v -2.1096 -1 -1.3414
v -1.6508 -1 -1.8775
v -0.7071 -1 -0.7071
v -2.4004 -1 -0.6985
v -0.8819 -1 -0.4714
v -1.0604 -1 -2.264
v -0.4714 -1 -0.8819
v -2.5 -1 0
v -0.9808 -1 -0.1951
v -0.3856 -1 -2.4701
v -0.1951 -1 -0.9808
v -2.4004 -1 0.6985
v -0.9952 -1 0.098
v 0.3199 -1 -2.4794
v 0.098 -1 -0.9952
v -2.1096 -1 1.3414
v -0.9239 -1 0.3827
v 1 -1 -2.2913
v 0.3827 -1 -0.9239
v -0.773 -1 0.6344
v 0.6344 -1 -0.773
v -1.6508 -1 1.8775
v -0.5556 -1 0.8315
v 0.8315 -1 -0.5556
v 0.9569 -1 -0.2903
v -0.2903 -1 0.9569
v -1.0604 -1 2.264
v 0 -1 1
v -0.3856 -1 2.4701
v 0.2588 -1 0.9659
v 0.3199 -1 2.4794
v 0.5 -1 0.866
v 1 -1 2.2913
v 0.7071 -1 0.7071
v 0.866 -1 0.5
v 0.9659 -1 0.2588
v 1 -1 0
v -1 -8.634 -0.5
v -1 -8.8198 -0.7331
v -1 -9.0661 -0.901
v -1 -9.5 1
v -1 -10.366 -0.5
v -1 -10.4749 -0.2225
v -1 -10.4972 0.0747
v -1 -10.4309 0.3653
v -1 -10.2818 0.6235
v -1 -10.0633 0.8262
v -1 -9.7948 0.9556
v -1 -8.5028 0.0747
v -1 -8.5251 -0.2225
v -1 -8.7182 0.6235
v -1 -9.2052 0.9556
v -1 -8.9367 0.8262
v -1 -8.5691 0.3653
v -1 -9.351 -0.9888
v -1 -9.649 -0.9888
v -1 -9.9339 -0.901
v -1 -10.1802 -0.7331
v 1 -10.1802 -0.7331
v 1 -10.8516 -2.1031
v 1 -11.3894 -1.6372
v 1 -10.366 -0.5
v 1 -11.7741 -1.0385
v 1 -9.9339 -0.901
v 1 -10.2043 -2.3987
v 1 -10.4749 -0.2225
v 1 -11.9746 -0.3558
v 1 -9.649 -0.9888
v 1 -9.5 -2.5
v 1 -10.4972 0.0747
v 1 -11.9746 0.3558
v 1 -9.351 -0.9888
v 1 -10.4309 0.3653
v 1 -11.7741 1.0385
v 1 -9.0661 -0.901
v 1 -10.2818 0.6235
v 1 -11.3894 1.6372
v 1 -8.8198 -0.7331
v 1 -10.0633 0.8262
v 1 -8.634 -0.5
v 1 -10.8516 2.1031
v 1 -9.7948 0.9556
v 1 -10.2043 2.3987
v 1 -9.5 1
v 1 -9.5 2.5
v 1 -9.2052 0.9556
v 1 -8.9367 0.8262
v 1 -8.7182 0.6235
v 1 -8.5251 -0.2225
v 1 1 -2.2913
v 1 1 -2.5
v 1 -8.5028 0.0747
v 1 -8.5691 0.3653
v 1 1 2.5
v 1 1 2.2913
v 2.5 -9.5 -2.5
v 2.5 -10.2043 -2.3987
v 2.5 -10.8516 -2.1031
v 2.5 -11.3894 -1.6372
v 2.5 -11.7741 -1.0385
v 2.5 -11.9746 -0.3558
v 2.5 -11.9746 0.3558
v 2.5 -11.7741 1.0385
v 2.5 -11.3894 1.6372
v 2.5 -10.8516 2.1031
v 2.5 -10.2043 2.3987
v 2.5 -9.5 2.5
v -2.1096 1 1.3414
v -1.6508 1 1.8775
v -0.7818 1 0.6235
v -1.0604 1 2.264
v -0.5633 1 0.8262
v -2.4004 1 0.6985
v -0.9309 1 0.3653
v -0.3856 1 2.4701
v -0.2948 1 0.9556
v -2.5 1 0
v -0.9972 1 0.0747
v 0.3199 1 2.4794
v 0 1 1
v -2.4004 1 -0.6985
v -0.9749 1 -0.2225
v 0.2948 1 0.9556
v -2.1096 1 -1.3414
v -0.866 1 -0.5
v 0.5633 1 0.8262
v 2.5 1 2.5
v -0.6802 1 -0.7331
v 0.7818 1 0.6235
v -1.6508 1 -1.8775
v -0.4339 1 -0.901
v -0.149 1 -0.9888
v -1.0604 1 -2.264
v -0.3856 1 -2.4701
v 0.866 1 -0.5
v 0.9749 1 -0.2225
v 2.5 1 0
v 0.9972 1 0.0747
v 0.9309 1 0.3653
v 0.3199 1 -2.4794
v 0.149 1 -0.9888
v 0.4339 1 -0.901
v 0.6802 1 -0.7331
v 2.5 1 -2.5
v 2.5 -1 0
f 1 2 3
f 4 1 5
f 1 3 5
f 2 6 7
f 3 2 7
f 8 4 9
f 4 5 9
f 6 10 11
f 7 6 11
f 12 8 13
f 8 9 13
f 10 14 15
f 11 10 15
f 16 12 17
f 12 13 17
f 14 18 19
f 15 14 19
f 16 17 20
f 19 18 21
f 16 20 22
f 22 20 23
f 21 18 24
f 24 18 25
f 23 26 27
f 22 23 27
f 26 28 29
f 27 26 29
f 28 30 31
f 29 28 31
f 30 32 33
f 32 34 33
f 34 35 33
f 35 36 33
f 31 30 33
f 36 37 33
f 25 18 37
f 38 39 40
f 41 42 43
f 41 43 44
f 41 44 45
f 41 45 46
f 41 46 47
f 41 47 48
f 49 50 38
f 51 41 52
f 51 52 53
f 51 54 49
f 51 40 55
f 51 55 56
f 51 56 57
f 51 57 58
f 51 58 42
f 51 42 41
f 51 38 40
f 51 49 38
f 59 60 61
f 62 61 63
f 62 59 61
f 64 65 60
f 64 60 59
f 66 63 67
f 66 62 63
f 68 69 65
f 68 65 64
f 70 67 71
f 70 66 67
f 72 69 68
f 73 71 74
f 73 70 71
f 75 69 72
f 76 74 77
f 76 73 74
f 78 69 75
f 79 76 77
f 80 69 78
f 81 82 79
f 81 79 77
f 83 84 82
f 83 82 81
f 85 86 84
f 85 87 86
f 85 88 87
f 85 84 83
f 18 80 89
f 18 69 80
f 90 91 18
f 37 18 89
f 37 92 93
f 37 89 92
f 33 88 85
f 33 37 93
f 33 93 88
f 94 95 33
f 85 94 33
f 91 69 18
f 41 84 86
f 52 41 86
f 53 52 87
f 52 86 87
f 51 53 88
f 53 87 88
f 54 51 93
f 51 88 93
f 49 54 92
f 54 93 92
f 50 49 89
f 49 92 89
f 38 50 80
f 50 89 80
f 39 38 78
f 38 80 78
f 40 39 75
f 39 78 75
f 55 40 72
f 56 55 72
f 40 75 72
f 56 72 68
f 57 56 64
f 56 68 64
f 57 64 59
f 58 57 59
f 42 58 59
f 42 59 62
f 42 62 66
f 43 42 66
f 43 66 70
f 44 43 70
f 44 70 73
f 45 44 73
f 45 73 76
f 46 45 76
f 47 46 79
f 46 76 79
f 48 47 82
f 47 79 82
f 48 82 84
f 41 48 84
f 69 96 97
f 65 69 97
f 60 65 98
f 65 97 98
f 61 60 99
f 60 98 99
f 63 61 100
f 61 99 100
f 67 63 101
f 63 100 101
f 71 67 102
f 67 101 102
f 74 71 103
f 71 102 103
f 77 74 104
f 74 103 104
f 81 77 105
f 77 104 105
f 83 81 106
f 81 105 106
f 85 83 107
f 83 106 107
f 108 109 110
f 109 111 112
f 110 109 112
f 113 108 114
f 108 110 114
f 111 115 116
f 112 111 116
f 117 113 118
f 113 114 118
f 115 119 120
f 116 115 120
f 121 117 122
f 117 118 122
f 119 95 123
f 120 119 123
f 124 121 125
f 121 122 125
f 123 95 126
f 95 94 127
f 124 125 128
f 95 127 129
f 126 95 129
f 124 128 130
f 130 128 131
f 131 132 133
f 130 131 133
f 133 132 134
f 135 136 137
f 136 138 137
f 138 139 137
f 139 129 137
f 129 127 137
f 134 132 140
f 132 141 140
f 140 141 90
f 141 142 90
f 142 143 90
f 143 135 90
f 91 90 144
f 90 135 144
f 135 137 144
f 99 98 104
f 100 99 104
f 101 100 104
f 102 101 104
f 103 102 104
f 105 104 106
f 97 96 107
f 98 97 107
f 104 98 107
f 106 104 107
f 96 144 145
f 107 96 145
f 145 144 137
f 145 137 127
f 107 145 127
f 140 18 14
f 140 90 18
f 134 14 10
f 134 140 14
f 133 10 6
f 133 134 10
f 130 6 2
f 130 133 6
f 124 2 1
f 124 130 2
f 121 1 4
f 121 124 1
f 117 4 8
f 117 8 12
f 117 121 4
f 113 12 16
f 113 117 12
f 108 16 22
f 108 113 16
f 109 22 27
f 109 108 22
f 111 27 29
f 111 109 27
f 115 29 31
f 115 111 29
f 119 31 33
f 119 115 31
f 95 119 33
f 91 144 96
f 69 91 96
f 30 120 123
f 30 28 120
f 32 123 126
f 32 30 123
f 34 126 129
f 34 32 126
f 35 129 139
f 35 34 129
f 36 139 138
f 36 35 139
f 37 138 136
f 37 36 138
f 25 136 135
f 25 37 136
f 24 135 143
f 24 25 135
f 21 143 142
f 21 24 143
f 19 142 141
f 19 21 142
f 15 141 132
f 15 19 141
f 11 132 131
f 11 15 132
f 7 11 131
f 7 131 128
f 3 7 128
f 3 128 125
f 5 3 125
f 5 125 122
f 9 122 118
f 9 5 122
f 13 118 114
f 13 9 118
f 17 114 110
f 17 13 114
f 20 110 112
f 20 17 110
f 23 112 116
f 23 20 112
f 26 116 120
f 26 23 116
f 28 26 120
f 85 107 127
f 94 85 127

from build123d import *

# Parameters (mm, degrees)
SKETCH1_R           = 2.5
SKETCH1_R_2         = 1
BOSS_EXTRUDE1_DEPTH = 1
BOSS_EXTRUDE2_DEPTH = 1.5
SKETCH5_R           = 1
BOSS_EXTRUDE3_DEPTH = 2


with BuildPart() as part:
    # Sketch1 → Boss-Extrude1 (new, symmetric)
    with BuildSketch(Plane(origin=(0, 0, 0), x_dir=(1, 0, 0), z_dir=(0, 1, 0))):
        with Locations(Location((0, 0, 0), (0, 0, 270))):
            Circle(SKETCH1_R)
        with Locations(Location((0, 0, 0), (0, 0, 270))):
            Circle(SKETCH1_R_2, mode=Mode.SUBTRACT)
    extrude(amount=BOSS_EXTRUDE1_DEPTH, both=True)

    # Sketch2 → Boss-Extrude2 (add)
    with BuildSketch(Plane(origin=(2.5, 0, 0), x_dir=(0, 0, -1), z_dir=(1, 0, 0))):
        with BuildLine():
            Line((-2.5, 1), (2.5, 1))
            Line((2.5, 1), (2.5, -9.5))
            ThreePointArc((2.5, -9.5), (0, -12), (-2.5, -9.5))
            Line((-2.5, -9.5), (-2.5, 1))
        make_face()
    extrude(amount=-BOSS_EXTRUDE2_DEPTH)

    # Sketch5 → Boss-Extrude3 (add)
    with BuildSketch(Plane.ZY.offset(-1)):
        with Locations((0, -9.5)):
            Circle(SKETCH5_R)
    extrude(amount=BOSS_EXTRUDE3_DEPTH)


solid = part.part
